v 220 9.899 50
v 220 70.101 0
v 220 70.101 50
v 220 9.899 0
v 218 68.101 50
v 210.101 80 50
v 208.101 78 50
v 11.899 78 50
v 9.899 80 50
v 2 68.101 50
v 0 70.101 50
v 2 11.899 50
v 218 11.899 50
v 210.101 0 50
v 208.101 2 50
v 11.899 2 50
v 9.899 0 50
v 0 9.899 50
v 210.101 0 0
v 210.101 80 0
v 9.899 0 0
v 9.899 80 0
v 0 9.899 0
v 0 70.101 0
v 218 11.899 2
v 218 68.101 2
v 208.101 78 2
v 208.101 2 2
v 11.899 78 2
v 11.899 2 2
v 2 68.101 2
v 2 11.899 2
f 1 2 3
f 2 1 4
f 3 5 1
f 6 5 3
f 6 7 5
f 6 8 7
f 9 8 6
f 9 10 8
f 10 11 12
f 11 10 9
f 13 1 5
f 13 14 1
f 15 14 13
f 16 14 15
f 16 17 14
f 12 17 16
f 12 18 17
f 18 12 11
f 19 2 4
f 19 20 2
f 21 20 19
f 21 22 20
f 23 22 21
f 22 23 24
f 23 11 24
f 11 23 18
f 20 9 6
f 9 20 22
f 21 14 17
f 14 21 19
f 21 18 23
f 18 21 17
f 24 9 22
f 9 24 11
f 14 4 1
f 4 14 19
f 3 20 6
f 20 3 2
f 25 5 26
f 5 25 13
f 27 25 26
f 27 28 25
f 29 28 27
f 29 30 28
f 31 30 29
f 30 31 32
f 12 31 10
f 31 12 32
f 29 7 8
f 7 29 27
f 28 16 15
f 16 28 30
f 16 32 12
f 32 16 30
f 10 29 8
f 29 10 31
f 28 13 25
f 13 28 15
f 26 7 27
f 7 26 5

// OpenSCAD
// Your settings:
length = 220;
width = 80;
height = 50; 
wall_thickness = 2;
bevel_box = 14;


module bevel_box(length, width, height,bevel_box){
    difference() {
        cube([length, width, height]);
        
        // top left
        translate([0, 0, height / 2]) {
            rotate(a=[0,0,45]) {
                cube([bevel_box, bevel_box , height], center=true);
            }
        }
        
        // top right 
        translate([0 ,width, height / 2]) {
            rotate(a=[0,0,45]) {
                cube([bevel_box, bevel_box , height], center=true);
            }
        }
        
        // top left
        translate([length, 0, height / 2]) {
            rotate(a=[0,0,45]) {
                cube([bevel_box, bevel_box , height], center=true);
            }
        }
        
        // top left
        translate([length, width, height / 2]) {
            rotate(a=[0,0,45]) {
                cube([bevel_box, bevel_box , height], center=true);
            }
        }
    }
}

difference() {
bevel_box(length, width, height, bevel_box);

#translate([wall_thickness, wall_thickness, wall_thickness]) {
    bevel_box(length - wall_thickness * 2, width - wall_thickness * 2, height +5, bevel_box);
 }
}
